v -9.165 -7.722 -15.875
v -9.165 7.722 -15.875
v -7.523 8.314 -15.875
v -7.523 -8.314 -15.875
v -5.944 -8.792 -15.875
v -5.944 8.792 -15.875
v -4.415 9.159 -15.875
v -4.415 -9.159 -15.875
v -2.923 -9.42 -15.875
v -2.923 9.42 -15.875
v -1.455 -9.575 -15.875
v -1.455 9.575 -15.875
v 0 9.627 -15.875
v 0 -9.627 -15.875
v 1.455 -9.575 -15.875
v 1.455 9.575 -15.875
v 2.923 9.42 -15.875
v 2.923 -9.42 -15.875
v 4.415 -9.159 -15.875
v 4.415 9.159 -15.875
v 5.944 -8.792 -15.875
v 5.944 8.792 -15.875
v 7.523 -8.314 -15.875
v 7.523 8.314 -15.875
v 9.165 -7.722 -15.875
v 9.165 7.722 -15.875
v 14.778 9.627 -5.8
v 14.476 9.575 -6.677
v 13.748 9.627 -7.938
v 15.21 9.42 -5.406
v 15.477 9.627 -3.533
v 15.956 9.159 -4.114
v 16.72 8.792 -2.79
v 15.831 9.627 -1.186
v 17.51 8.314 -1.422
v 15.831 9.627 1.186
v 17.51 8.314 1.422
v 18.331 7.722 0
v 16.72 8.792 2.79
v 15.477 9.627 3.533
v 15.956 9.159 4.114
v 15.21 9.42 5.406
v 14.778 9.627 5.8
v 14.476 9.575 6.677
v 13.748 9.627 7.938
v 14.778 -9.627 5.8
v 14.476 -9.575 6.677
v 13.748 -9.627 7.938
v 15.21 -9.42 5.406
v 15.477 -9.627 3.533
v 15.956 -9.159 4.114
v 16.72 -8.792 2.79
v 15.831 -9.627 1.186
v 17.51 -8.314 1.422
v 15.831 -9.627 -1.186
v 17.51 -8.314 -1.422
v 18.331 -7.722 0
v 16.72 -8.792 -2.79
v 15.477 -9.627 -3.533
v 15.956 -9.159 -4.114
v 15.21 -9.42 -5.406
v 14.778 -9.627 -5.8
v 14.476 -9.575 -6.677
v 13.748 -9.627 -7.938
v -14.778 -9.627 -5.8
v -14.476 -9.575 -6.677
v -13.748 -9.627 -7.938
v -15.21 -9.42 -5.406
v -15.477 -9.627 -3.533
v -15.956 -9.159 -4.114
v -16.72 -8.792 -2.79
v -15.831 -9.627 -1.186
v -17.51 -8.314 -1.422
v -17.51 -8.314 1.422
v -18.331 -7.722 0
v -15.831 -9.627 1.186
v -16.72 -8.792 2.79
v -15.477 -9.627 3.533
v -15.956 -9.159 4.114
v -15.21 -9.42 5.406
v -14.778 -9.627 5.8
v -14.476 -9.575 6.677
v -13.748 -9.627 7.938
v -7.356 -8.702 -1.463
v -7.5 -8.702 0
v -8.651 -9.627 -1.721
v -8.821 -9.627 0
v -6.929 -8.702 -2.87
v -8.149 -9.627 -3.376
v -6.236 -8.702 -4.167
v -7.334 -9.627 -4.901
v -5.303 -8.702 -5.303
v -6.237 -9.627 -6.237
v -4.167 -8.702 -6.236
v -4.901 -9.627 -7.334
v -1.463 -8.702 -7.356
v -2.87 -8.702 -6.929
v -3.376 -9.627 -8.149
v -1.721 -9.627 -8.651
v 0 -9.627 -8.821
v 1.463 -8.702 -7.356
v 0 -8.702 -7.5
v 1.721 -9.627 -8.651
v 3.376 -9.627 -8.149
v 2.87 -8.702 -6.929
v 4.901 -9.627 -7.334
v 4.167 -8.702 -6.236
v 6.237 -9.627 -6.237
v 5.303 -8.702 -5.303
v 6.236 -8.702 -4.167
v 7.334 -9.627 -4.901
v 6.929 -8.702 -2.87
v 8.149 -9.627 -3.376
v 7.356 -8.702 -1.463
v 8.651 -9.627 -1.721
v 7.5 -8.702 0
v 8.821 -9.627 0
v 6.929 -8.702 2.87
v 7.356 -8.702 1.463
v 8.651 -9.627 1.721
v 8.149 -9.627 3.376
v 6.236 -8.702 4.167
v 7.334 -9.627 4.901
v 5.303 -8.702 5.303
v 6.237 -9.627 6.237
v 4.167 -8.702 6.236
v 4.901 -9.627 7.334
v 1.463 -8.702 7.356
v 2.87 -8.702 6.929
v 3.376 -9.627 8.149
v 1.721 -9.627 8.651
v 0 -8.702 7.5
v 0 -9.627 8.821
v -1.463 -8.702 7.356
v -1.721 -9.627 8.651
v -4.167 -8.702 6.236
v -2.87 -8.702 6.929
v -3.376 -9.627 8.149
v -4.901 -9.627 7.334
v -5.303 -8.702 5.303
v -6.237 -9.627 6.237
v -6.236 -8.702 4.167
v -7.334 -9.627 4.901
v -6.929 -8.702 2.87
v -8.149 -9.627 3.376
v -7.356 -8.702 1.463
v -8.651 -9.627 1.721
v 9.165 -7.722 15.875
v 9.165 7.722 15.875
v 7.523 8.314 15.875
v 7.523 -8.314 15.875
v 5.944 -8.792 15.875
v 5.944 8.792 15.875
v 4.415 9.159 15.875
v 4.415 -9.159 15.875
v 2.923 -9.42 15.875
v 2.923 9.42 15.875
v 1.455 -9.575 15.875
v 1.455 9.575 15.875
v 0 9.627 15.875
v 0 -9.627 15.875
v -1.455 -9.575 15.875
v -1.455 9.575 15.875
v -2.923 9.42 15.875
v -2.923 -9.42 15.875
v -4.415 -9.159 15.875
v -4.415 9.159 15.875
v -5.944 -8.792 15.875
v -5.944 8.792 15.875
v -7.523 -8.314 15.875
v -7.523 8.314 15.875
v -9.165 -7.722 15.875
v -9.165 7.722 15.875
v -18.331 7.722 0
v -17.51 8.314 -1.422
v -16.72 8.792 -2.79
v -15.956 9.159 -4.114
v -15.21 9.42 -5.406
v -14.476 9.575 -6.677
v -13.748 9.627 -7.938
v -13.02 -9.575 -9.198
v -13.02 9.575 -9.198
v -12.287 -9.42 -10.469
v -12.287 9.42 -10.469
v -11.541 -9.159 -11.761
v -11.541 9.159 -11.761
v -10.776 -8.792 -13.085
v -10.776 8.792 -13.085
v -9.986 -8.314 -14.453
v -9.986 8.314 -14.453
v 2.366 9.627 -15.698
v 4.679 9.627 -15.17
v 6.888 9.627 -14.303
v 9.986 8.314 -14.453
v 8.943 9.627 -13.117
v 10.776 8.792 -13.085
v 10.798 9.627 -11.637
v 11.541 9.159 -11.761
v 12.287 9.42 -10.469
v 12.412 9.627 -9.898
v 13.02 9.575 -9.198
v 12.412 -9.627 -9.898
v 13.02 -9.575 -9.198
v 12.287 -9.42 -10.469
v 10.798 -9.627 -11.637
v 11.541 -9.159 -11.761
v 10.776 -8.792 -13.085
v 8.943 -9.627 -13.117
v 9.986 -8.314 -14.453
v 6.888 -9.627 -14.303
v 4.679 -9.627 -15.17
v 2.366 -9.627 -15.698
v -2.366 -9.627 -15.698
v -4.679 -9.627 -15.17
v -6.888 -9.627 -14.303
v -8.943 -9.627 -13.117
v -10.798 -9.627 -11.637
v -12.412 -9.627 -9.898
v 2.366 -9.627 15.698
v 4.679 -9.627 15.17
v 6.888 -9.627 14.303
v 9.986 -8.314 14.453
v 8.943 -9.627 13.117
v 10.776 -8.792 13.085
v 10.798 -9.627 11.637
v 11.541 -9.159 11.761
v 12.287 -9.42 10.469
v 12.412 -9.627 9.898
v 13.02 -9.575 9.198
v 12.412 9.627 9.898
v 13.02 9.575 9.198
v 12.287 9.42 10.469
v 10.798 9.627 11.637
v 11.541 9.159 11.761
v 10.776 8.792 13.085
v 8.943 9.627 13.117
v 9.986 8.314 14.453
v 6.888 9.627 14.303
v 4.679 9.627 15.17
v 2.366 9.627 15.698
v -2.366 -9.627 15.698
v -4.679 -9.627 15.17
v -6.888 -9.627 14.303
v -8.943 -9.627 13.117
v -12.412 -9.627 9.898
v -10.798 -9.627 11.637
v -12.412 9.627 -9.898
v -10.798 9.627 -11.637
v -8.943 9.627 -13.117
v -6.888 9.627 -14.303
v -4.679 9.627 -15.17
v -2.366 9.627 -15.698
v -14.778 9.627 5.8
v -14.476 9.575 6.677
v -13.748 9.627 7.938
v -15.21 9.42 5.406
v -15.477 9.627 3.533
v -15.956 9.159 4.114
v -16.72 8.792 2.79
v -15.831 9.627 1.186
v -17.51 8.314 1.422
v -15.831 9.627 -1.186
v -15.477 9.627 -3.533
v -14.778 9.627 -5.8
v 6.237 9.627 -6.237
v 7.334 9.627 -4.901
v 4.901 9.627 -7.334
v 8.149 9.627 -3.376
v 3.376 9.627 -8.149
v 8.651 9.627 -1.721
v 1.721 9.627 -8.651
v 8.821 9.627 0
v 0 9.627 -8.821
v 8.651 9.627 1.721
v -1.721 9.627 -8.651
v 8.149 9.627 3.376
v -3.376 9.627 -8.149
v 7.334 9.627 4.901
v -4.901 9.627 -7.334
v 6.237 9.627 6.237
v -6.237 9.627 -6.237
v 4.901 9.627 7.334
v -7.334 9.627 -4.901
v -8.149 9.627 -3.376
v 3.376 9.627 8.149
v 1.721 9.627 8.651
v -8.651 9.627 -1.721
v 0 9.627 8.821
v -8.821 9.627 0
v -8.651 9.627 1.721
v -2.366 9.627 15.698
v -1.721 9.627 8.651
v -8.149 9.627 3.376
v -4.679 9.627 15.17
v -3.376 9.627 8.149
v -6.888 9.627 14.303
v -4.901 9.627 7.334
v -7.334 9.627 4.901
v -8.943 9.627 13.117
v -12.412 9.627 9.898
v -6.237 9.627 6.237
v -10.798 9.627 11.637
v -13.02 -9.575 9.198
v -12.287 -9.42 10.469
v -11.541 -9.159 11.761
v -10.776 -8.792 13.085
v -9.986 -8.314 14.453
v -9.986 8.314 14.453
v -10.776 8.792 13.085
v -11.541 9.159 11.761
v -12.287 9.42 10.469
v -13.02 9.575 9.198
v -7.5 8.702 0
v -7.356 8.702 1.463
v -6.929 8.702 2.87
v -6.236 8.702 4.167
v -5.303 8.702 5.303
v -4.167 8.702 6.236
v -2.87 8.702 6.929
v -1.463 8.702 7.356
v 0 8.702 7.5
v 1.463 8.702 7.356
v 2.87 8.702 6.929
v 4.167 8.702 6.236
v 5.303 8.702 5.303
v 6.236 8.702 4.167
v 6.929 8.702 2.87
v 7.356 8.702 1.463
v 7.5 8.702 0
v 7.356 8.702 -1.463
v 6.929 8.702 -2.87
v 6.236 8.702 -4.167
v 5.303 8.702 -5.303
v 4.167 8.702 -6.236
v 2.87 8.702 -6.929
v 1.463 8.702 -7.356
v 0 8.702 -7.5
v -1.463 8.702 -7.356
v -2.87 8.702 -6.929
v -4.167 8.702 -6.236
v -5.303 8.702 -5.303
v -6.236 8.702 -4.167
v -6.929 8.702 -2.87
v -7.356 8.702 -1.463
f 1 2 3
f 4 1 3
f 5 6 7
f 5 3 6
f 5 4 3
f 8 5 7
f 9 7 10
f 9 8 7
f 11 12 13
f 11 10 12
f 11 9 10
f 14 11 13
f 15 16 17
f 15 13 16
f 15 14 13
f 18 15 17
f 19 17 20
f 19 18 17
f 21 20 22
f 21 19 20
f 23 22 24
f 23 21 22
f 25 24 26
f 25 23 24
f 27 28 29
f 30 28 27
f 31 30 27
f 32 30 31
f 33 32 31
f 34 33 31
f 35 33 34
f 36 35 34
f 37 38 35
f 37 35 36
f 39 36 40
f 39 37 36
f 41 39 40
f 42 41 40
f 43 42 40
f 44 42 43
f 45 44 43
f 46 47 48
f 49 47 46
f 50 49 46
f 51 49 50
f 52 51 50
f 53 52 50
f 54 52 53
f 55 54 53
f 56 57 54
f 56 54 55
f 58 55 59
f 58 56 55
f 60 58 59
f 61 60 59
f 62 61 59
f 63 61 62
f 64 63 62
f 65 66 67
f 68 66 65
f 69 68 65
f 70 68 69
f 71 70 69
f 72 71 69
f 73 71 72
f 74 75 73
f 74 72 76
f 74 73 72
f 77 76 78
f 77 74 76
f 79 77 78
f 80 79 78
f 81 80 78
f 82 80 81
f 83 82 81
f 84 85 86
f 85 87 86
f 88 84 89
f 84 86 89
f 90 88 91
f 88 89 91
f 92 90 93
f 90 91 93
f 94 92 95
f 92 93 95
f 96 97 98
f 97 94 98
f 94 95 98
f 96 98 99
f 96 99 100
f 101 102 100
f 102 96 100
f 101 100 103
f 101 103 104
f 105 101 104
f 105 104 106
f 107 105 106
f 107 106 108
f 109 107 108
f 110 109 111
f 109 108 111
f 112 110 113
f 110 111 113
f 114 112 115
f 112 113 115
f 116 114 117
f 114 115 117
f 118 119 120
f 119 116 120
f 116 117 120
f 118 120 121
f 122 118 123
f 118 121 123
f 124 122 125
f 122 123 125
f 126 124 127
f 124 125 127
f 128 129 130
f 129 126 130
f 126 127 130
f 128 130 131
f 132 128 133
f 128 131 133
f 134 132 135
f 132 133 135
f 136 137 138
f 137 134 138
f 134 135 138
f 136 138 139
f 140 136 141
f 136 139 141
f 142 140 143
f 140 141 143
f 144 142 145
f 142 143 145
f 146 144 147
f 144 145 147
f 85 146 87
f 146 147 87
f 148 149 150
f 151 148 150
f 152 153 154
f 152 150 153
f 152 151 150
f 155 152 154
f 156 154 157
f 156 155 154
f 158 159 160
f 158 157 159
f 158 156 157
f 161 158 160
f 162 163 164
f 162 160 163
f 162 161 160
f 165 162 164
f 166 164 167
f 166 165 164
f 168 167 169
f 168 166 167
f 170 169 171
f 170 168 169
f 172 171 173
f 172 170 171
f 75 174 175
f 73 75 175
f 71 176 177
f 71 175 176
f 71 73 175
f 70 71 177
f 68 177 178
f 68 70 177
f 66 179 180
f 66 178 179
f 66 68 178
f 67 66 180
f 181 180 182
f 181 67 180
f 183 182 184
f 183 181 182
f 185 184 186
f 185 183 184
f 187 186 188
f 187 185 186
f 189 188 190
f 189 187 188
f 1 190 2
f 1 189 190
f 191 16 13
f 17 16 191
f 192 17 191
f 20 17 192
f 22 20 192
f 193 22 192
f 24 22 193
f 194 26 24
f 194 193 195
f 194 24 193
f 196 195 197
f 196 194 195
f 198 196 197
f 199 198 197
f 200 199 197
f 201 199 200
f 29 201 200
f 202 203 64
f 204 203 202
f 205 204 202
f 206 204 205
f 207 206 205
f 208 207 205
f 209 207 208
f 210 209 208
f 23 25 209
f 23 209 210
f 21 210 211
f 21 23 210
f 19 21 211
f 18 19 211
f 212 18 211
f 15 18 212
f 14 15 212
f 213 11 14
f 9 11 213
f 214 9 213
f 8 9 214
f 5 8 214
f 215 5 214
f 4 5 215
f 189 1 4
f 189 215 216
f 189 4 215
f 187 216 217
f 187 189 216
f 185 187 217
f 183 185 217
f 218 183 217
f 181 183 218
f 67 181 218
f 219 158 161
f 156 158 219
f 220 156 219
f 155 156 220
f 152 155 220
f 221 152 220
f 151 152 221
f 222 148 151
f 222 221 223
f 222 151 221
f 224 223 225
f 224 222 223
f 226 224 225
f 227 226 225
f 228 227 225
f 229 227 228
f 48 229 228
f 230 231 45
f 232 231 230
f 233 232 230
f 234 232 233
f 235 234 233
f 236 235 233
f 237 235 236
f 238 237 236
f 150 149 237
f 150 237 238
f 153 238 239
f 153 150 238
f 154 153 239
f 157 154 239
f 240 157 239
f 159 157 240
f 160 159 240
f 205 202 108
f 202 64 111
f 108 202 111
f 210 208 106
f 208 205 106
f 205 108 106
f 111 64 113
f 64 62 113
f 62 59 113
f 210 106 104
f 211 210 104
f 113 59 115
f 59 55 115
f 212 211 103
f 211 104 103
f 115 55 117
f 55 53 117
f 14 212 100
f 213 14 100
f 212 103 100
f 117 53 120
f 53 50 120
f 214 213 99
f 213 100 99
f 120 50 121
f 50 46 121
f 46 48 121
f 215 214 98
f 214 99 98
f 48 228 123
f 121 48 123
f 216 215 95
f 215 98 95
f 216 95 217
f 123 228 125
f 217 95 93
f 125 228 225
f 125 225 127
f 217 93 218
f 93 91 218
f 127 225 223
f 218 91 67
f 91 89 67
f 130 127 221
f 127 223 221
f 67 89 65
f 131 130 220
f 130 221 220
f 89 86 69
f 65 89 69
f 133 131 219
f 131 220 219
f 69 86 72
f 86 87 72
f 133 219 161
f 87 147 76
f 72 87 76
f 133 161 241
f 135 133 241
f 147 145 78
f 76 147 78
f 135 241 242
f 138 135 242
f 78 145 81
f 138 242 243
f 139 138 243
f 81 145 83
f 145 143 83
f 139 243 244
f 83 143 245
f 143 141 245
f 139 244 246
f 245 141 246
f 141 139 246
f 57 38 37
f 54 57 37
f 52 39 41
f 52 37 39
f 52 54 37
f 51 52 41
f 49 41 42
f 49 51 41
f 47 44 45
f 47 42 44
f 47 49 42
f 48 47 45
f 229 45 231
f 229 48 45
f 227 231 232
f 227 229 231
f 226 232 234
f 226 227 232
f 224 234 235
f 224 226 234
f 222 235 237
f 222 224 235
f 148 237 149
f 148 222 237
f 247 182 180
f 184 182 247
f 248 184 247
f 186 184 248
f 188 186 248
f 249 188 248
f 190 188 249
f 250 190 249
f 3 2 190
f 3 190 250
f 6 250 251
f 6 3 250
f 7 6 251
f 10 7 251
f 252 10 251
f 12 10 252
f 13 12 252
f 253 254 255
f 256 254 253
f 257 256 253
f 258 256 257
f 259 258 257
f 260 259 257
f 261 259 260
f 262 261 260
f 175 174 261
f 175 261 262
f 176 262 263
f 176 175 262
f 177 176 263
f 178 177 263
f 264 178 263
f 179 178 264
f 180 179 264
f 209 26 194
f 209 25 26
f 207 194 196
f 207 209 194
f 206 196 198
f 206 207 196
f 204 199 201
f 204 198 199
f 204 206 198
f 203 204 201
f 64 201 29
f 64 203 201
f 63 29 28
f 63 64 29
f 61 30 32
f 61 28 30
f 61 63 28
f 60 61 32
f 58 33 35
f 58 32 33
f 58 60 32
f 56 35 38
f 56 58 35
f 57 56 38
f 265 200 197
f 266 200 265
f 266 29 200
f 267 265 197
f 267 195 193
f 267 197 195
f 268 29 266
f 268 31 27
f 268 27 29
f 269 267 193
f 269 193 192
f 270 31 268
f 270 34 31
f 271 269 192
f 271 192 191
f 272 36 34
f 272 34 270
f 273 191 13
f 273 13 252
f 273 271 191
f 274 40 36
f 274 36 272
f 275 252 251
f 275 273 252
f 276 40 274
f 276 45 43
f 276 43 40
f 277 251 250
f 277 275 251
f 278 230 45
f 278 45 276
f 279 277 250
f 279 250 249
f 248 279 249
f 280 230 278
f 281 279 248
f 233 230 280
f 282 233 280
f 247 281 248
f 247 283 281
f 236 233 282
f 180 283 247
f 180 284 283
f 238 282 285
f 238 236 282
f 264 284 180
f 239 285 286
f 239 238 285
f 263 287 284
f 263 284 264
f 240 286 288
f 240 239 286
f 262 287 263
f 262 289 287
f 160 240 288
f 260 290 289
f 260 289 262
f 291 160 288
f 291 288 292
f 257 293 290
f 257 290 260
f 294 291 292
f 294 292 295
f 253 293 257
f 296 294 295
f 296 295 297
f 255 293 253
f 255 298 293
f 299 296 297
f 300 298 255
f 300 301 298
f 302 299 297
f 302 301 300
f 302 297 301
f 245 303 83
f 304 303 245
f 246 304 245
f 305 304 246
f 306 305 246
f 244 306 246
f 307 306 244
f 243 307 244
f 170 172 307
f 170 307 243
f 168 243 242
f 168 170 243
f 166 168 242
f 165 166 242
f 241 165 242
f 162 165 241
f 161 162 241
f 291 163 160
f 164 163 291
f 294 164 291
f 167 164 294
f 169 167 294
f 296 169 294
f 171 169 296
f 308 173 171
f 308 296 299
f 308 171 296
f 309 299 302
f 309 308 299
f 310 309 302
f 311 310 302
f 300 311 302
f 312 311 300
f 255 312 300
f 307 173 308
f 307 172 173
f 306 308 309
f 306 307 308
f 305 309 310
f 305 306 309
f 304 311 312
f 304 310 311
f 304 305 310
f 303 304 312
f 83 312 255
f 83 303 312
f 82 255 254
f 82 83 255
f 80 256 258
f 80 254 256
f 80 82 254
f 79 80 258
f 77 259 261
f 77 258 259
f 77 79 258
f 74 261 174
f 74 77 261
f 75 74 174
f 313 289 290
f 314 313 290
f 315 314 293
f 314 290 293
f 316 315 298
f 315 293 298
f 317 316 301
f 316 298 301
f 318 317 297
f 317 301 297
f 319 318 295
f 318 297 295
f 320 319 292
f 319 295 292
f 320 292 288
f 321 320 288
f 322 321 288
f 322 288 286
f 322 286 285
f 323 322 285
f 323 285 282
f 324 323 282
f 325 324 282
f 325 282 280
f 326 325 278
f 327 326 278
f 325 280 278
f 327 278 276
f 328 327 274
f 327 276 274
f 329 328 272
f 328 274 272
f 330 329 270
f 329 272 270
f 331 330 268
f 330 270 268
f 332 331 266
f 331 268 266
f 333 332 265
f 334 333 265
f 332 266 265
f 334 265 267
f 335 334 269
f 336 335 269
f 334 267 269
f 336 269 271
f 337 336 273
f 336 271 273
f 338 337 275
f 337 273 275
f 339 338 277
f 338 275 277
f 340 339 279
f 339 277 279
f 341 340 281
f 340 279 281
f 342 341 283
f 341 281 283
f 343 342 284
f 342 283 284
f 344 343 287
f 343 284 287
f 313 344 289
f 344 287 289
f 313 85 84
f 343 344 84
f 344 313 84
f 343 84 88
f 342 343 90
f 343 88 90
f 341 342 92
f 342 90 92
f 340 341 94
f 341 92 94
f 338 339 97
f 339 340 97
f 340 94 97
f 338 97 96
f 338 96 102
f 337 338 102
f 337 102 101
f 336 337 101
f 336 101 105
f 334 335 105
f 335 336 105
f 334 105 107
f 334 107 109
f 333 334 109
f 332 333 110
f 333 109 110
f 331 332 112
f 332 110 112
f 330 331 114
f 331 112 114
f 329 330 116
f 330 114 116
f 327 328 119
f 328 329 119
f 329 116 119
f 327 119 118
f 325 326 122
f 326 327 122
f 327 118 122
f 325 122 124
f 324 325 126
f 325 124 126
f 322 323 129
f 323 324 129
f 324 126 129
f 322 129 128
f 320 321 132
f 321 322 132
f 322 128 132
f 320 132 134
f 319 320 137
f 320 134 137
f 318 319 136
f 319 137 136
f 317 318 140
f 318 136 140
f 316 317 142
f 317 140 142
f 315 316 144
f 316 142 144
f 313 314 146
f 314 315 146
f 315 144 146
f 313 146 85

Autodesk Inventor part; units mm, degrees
ref_plane "YZ Plane" through (0, 0, 0) normal (1, 0, 0) x (0, 1, 0)
ref_plane "XZ Plane" through (0, 0, 0) normal (0, 1, 0) x (-1, 0, 0)
ref_plane "XY Plane" through (0, 0, 0) normal (0, 0, 1) x (1, 0, 0)
sketch "Sketch1" plane through (0, 0, 0) normal (0, 1, 0) x (-1, 0, 0)
  line L0 (9.1654, 15.875) -> (18.3309, 0)
  line L1 (18.3309, 0) -> (9.1654, -15.875)
  line L2 (9.1654, -15.875) -> (-9.1654, -15.875)
  line L3 (-9.1654, -15.875) -> (-18.3309, 0)
  line L4 (-18.3309, 0) -> (-9.1654, 15.875)
  line L5 (-9.1654, 15.875) -> (9.1654, 15.875)
  circle A0 centre (0, 0) radius 7.5
  dimension "HEX_FLATS" = 31.75
  dimension "NUT_SIZE" = 15
extrude "Extrusion1" add sketch "Sketch1" along normal mid plane 19.2532
sketch "Sketch2" plane through (0, 0, 0) normal (0, 0, 1) x (1, 0, 0)
  line L0 (18.3309, -9.6266) -> (9.1654, -9.6266) projected
  line L1 (15.875, -9.6266) -> (18.3309, -7.7216)
  line L2 (28.575, -7.7216) -> (28.575, -20.4216)
  line L3 (28.575, -20.4216) -> (15.875, -20.4216)
  line L4 (15.875, -20.4216) -> (15.875, -9.6266)
  line L5 (0, 0) -> (0, -1.2828)
  line L6 (18.3309, 9.6266) -> (18.3309, -9.6266) projected
  line L7 (18.3309, -7.7216) -> (28.575, -7.7216)
  line L8 (18.3309, 0) -> (27.089, 0) construction
  dimension "OUTSIDE_CHAMFER_LONG" = 15.875
  dimension "OUTSIDE_CHAMFER_SHORT" = 1.905
  dimension "d12" = 12.7
  dimension "d13" = 12.7
revolve "Revolution1" cut sketch "Sketch2" angle 360 about axis through (0, 0, 0) along (0, -1, 0)
mirror "Mirror1" about plane through (0, 0, 0) normal (0, 1, 0) of "Revolution1"
chamfer "Chamfer1" distance 1.3208 angle 35 1 edges at (7.5, 9.6266, 0) measured on face at (8.9141, 9.6266, 9.4797)
chamfer "Chamfer2" distance 1.3208 angle 35 1 edges at (7.5, -9.6266, 0) measured on face at (8.9141, -9.6266, 9.4797)
properties material "Stainless Steel"
